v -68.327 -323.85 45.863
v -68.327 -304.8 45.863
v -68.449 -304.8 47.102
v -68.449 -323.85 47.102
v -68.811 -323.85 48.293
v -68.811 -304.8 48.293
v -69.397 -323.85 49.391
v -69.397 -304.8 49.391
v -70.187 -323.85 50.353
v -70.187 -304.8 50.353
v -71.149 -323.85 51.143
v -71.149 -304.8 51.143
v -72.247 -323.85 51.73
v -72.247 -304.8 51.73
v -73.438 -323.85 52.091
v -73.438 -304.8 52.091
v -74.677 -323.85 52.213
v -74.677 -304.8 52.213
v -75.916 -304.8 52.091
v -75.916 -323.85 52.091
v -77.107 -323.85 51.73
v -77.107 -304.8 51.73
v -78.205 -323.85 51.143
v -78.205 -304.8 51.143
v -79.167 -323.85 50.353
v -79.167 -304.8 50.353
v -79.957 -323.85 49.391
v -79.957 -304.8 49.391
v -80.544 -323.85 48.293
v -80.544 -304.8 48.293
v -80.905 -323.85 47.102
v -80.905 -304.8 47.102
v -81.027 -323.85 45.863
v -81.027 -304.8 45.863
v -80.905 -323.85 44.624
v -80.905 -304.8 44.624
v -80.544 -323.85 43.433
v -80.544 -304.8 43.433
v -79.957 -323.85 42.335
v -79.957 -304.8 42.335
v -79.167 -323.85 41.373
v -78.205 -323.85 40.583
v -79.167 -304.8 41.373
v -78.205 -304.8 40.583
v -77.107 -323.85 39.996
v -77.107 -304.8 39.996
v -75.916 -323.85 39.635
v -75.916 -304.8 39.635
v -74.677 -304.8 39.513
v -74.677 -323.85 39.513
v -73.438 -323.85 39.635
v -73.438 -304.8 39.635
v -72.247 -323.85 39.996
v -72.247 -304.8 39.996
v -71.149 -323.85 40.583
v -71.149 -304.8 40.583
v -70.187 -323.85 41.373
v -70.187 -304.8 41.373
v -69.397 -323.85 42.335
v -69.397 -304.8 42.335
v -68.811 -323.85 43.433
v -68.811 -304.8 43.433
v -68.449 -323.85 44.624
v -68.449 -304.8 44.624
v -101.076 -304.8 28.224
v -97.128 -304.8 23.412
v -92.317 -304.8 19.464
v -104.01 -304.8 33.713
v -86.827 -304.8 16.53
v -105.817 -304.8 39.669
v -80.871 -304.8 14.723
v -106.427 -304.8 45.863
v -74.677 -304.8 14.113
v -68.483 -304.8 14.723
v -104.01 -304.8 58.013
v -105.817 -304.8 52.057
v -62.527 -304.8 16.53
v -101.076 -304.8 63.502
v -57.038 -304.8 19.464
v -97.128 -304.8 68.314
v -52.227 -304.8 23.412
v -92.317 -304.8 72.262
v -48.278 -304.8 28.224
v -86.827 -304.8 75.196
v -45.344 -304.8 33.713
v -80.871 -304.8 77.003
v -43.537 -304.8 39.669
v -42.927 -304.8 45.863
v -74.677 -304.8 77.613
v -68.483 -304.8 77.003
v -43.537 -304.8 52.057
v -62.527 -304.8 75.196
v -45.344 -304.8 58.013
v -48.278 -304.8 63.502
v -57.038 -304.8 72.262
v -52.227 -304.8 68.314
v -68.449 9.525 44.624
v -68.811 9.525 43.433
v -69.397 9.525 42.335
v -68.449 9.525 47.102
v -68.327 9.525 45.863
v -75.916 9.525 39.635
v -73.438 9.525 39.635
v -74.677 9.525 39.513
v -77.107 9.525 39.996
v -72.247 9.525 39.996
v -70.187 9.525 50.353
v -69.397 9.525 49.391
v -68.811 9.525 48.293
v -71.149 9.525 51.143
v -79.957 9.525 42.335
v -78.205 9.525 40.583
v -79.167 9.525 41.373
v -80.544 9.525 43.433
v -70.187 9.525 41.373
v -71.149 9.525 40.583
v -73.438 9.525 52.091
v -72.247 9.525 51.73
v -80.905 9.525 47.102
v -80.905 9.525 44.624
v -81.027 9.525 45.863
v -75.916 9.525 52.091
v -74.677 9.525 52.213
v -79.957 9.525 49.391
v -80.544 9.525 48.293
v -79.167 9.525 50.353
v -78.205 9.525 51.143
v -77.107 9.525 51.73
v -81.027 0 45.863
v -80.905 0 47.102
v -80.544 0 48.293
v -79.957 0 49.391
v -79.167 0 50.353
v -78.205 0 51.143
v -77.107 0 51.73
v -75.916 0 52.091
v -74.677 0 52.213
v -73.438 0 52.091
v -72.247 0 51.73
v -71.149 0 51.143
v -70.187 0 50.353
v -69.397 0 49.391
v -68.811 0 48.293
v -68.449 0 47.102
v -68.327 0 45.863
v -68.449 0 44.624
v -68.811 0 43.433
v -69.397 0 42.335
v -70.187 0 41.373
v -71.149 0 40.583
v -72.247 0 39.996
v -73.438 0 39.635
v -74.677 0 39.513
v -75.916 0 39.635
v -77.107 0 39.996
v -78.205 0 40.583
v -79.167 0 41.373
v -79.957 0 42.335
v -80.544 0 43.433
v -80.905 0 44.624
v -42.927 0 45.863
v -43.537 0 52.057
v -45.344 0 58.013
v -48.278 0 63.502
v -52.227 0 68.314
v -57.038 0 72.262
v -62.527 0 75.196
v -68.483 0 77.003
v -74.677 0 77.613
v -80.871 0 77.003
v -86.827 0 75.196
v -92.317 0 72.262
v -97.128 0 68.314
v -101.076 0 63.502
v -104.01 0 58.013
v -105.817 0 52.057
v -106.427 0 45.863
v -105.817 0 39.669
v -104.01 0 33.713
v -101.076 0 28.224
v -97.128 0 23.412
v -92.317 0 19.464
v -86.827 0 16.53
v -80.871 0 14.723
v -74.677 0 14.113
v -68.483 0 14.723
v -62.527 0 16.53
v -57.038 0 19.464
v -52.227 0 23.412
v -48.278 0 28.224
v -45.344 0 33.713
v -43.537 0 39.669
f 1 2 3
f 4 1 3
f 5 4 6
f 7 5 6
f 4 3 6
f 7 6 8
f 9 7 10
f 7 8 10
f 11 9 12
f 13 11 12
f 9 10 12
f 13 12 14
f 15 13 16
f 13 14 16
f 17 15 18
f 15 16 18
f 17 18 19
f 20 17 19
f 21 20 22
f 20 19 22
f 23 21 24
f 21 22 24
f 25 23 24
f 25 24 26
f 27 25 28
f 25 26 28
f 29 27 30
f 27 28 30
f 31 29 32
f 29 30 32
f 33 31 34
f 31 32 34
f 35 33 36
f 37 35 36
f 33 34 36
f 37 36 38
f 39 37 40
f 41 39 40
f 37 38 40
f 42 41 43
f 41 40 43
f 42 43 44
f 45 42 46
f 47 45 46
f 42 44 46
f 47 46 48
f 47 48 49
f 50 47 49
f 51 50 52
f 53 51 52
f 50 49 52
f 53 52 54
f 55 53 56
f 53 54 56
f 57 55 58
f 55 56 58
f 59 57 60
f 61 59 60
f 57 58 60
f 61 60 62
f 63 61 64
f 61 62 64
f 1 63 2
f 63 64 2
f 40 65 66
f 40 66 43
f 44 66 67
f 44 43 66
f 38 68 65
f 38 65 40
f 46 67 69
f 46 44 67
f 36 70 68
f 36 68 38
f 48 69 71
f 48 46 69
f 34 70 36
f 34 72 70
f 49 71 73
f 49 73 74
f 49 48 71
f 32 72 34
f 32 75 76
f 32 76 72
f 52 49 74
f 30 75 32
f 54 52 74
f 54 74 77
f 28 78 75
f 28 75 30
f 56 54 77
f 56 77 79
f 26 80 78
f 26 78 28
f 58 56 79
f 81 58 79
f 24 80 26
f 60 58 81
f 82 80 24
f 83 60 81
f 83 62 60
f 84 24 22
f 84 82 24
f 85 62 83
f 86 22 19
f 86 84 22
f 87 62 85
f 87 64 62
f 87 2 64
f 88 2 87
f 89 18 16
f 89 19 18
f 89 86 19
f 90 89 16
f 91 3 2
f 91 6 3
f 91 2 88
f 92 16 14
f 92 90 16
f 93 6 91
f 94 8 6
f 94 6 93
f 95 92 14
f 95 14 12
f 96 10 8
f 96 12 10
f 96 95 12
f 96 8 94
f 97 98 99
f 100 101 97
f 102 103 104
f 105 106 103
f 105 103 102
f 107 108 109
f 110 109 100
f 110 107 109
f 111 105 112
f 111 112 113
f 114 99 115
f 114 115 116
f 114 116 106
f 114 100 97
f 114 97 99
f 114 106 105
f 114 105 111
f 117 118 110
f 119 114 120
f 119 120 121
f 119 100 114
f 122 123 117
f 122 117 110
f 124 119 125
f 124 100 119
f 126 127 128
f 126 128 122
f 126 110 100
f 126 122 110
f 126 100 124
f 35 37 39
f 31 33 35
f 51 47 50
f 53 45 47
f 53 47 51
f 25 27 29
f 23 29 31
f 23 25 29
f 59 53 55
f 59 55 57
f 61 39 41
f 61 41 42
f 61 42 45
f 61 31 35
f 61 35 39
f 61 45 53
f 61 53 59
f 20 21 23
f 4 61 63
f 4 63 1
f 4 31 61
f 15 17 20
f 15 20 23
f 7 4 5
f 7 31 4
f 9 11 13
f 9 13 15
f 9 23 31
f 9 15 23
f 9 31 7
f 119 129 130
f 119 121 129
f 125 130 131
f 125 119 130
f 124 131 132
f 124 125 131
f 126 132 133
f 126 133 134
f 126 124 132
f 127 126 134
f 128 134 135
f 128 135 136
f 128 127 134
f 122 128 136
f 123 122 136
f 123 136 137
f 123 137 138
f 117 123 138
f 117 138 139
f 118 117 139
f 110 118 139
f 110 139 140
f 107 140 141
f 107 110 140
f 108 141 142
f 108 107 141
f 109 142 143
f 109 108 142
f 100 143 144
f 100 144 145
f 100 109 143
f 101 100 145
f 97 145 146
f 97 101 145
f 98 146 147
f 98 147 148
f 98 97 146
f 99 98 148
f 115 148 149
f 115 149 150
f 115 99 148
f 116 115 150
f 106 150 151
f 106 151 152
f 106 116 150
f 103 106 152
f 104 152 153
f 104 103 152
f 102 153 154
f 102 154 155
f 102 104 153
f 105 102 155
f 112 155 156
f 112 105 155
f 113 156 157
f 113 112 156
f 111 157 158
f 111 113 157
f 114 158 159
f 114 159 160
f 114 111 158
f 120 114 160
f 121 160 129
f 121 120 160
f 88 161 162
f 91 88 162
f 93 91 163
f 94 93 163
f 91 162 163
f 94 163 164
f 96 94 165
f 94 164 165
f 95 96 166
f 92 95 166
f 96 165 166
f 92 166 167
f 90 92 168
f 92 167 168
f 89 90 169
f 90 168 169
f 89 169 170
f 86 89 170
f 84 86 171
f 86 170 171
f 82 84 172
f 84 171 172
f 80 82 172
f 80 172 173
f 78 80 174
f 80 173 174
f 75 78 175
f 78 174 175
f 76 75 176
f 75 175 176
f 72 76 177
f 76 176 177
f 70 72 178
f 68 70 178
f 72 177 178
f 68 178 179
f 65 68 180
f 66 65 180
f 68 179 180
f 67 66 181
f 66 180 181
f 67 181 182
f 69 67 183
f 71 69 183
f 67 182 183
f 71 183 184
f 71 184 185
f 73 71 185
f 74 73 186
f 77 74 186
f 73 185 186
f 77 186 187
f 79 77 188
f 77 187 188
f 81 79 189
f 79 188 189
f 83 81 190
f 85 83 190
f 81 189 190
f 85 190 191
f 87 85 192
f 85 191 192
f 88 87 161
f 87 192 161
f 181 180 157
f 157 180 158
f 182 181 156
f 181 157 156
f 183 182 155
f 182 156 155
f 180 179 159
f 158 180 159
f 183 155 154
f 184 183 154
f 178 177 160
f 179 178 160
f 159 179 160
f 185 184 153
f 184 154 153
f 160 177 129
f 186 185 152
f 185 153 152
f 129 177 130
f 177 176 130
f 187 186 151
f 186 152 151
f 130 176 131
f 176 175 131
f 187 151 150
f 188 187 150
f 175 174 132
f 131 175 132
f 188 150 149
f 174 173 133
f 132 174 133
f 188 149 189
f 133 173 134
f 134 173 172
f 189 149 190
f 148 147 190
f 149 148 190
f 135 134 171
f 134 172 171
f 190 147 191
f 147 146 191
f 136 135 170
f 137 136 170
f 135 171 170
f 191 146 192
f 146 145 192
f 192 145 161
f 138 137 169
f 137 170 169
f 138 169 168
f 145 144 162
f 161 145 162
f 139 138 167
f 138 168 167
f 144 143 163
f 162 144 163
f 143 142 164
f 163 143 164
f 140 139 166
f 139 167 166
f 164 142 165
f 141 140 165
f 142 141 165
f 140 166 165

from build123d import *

# Parameters (mm, degrees)
F0_R     = 31.75
F1_DEPTH = 304.8
F2_R     = 6.35
F3_DEPTH = 9.525
F4_R     = 6.35
F5_DEPTH = 19.05


with BuildPart() as f1:
    # F0 (on Front) → F1 (new body)
    with BuildSketch(Plane.XZ):
        with Locations((-74.6771916747, 45.8630174398)):
            Circle(F0_R)
    extrude(amount=F1_DEPTH)

    # F2 (on face) → F3 (join, symmetric)
    with BuildSketch(Plane(origin=(0, 0, 0), x_dir=(-1, 0, 0), z_dir=(0, 1, 0))):
        with Locations((74.6771916747, 45.8630174398)):
            Circle(F2_R)
    extrude(amount=F3_DEPTH, both=True)

    # F4 (on face) → F5 (join)
    with BuildSketch(Plane.XZ.offset(304.8)):
        with Locations((-74.6771916747, 45.8630174398)):
            Circle(F4_R)
    extrude(amount=F5_DEPTH)


solid = f1.part
